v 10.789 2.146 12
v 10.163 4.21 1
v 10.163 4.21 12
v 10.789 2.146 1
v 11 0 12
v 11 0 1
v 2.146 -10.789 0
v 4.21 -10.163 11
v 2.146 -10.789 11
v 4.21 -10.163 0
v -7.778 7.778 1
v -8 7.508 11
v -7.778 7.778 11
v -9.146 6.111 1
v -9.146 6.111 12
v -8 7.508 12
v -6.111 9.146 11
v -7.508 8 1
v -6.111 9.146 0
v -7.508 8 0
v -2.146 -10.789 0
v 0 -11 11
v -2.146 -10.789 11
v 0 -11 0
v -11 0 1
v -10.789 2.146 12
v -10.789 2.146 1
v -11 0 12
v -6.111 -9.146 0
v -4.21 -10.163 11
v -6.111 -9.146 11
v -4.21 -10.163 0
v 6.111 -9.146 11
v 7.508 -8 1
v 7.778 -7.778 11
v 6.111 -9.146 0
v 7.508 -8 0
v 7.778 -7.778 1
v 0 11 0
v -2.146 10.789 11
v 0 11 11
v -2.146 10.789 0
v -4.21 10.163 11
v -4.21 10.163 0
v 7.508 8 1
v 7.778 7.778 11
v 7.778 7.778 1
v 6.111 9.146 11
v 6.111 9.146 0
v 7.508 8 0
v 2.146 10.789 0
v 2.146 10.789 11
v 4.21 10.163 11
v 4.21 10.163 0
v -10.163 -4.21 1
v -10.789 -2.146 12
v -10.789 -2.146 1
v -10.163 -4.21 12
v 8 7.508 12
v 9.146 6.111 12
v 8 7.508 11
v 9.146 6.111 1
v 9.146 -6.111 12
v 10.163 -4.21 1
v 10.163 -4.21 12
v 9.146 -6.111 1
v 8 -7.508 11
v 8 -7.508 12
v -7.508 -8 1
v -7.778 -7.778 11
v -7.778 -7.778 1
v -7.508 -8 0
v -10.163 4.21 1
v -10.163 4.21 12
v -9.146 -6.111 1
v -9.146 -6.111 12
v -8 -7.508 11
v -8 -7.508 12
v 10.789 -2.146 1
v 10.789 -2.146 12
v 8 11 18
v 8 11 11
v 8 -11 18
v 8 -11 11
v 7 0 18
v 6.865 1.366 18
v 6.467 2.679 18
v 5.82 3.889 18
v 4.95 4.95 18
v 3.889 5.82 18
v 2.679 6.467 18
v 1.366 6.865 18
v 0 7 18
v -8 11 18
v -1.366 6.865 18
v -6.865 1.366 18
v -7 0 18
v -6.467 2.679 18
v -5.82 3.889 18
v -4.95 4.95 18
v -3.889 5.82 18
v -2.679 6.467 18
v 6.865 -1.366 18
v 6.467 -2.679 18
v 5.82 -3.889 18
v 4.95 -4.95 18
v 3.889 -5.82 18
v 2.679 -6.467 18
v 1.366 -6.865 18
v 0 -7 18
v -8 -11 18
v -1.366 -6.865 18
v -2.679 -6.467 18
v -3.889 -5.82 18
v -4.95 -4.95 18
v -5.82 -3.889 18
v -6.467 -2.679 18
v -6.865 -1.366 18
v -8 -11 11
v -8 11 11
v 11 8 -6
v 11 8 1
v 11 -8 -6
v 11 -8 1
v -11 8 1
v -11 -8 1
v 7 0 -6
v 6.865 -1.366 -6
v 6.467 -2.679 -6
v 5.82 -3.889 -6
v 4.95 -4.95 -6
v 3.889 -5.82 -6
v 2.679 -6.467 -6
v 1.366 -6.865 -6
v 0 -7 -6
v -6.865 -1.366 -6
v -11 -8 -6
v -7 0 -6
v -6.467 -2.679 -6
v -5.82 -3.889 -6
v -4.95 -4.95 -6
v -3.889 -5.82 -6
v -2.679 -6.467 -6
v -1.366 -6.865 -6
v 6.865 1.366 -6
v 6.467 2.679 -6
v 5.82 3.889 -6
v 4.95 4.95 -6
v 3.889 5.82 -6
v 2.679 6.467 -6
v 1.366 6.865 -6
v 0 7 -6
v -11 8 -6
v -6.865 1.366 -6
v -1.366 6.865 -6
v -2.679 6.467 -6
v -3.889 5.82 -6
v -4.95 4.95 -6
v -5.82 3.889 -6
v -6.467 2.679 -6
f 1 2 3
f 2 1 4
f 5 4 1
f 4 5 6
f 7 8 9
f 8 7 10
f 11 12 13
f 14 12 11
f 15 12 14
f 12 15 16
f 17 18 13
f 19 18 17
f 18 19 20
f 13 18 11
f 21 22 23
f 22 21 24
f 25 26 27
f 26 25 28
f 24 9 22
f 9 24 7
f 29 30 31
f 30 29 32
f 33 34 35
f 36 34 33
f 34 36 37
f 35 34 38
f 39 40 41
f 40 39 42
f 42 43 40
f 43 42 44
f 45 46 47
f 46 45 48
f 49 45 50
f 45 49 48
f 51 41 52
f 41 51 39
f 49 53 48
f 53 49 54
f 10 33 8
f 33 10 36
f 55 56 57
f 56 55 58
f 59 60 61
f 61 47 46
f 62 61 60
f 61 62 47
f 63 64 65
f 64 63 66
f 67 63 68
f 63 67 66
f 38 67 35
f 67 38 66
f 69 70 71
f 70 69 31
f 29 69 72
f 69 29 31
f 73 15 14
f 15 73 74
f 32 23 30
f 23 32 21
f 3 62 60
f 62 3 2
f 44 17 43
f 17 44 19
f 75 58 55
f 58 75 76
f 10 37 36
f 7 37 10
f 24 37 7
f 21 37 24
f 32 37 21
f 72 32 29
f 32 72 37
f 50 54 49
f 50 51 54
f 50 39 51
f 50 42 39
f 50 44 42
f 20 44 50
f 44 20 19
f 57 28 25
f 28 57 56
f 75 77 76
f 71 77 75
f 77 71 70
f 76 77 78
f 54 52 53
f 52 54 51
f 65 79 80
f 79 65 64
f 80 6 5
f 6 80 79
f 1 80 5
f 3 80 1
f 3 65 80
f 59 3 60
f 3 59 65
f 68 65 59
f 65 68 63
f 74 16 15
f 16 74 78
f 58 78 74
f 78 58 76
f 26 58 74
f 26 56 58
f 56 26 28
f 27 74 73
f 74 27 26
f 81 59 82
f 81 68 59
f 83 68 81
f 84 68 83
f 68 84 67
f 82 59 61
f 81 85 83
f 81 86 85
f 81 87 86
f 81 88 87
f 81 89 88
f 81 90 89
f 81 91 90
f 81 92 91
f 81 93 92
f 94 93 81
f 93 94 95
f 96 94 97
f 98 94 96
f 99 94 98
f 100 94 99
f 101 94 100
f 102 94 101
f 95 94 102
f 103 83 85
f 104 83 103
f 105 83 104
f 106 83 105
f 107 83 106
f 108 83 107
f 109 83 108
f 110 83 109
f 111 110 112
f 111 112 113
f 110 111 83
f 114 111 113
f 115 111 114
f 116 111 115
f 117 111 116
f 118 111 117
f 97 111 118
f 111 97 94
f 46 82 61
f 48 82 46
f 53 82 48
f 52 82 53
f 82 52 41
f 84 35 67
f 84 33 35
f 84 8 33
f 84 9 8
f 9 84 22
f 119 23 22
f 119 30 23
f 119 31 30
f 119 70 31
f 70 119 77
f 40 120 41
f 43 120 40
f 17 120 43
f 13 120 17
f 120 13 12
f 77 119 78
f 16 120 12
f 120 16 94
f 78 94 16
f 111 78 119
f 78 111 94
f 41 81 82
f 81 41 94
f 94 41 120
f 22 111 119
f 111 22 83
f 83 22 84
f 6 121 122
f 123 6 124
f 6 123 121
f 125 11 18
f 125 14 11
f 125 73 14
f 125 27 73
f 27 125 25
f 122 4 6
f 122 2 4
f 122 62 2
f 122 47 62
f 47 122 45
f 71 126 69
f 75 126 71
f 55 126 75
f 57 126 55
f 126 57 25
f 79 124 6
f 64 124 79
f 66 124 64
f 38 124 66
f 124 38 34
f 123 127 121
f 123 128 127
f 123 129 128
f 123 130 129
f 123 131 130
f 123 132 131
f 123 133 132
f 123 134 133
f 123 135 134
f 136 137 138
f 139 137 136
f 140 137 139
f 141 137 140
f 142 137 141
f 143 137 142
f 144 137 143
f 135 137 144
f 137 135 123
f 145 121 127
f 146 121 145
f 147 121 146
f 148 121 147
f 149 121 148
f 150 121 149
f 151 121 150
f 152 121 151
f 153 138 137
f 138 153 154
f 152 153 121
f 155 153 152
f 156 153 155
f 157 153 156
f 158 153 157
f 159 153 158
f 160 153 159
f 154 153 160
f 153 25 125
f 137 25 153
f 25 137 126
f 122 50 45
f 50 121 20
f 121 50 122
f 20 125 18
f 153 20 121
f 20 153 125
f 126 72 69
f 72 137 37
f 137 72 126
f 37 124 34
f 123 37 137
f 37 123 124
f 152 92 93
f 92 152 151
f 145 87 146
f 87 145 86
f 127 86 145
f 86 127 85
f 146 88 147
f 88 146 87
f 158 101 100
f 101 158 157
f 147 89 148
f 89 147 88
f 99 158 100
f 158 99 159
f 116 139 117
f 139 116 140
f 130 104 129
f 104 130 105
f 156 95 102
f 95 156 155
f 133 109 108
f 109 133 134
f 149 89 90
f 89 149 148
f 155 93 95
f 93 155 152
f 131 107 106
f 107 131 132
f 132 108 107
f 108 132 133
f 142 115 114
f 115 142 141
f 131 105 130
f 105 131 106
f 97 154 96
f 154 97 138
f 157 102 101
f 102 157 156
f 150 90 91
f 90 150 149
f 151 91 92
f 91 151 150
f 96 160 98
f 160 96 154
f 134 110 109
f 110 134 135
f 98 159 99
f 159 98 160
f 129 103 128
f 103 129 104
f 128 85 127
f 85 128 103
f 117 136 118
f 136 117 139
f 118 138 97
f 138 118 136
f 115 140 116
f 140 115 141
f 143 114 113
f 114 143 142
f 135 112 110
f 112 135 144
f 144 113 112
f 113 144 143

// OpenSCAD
$fn = 32;

// ----------------------------------------------------------------------
// Oldham coupling disc: 22 x 24 mm
// ----------------------------------------------------------------------

// --- parameters (mm) ---
disc_d = 22;              // disc diameter
disc_t = 12;              // disc thickness
tongue_w = 16;            // tongue width
tongue_h = 6;             // tongue height
bore_d = 14;              // centre lightening bore

module disc() {
  cylinder(h = disc_t, d = disc_d);
  /* tongue on the top face, sunk 1 mm into the disc */
  translate([-tongue_w / 2, -disc_d / 2, disc_t - 1]) cube([tongue_w, disc_d, tongue_h + 1]);
  /* slot wall on the bottom face, 90 degrees turned */
  translate([-disc_d / 2, -tongue_w / 2, -tongue_h]) cube([disc_d, tongue_w, tongue_h + 1]);
}

difference() {
  disc();
  translate([0, 0, -tongue_h - 1]) cylinder(h = disc_t + 2 * tongue_h + 2, d = bore_d);
}
